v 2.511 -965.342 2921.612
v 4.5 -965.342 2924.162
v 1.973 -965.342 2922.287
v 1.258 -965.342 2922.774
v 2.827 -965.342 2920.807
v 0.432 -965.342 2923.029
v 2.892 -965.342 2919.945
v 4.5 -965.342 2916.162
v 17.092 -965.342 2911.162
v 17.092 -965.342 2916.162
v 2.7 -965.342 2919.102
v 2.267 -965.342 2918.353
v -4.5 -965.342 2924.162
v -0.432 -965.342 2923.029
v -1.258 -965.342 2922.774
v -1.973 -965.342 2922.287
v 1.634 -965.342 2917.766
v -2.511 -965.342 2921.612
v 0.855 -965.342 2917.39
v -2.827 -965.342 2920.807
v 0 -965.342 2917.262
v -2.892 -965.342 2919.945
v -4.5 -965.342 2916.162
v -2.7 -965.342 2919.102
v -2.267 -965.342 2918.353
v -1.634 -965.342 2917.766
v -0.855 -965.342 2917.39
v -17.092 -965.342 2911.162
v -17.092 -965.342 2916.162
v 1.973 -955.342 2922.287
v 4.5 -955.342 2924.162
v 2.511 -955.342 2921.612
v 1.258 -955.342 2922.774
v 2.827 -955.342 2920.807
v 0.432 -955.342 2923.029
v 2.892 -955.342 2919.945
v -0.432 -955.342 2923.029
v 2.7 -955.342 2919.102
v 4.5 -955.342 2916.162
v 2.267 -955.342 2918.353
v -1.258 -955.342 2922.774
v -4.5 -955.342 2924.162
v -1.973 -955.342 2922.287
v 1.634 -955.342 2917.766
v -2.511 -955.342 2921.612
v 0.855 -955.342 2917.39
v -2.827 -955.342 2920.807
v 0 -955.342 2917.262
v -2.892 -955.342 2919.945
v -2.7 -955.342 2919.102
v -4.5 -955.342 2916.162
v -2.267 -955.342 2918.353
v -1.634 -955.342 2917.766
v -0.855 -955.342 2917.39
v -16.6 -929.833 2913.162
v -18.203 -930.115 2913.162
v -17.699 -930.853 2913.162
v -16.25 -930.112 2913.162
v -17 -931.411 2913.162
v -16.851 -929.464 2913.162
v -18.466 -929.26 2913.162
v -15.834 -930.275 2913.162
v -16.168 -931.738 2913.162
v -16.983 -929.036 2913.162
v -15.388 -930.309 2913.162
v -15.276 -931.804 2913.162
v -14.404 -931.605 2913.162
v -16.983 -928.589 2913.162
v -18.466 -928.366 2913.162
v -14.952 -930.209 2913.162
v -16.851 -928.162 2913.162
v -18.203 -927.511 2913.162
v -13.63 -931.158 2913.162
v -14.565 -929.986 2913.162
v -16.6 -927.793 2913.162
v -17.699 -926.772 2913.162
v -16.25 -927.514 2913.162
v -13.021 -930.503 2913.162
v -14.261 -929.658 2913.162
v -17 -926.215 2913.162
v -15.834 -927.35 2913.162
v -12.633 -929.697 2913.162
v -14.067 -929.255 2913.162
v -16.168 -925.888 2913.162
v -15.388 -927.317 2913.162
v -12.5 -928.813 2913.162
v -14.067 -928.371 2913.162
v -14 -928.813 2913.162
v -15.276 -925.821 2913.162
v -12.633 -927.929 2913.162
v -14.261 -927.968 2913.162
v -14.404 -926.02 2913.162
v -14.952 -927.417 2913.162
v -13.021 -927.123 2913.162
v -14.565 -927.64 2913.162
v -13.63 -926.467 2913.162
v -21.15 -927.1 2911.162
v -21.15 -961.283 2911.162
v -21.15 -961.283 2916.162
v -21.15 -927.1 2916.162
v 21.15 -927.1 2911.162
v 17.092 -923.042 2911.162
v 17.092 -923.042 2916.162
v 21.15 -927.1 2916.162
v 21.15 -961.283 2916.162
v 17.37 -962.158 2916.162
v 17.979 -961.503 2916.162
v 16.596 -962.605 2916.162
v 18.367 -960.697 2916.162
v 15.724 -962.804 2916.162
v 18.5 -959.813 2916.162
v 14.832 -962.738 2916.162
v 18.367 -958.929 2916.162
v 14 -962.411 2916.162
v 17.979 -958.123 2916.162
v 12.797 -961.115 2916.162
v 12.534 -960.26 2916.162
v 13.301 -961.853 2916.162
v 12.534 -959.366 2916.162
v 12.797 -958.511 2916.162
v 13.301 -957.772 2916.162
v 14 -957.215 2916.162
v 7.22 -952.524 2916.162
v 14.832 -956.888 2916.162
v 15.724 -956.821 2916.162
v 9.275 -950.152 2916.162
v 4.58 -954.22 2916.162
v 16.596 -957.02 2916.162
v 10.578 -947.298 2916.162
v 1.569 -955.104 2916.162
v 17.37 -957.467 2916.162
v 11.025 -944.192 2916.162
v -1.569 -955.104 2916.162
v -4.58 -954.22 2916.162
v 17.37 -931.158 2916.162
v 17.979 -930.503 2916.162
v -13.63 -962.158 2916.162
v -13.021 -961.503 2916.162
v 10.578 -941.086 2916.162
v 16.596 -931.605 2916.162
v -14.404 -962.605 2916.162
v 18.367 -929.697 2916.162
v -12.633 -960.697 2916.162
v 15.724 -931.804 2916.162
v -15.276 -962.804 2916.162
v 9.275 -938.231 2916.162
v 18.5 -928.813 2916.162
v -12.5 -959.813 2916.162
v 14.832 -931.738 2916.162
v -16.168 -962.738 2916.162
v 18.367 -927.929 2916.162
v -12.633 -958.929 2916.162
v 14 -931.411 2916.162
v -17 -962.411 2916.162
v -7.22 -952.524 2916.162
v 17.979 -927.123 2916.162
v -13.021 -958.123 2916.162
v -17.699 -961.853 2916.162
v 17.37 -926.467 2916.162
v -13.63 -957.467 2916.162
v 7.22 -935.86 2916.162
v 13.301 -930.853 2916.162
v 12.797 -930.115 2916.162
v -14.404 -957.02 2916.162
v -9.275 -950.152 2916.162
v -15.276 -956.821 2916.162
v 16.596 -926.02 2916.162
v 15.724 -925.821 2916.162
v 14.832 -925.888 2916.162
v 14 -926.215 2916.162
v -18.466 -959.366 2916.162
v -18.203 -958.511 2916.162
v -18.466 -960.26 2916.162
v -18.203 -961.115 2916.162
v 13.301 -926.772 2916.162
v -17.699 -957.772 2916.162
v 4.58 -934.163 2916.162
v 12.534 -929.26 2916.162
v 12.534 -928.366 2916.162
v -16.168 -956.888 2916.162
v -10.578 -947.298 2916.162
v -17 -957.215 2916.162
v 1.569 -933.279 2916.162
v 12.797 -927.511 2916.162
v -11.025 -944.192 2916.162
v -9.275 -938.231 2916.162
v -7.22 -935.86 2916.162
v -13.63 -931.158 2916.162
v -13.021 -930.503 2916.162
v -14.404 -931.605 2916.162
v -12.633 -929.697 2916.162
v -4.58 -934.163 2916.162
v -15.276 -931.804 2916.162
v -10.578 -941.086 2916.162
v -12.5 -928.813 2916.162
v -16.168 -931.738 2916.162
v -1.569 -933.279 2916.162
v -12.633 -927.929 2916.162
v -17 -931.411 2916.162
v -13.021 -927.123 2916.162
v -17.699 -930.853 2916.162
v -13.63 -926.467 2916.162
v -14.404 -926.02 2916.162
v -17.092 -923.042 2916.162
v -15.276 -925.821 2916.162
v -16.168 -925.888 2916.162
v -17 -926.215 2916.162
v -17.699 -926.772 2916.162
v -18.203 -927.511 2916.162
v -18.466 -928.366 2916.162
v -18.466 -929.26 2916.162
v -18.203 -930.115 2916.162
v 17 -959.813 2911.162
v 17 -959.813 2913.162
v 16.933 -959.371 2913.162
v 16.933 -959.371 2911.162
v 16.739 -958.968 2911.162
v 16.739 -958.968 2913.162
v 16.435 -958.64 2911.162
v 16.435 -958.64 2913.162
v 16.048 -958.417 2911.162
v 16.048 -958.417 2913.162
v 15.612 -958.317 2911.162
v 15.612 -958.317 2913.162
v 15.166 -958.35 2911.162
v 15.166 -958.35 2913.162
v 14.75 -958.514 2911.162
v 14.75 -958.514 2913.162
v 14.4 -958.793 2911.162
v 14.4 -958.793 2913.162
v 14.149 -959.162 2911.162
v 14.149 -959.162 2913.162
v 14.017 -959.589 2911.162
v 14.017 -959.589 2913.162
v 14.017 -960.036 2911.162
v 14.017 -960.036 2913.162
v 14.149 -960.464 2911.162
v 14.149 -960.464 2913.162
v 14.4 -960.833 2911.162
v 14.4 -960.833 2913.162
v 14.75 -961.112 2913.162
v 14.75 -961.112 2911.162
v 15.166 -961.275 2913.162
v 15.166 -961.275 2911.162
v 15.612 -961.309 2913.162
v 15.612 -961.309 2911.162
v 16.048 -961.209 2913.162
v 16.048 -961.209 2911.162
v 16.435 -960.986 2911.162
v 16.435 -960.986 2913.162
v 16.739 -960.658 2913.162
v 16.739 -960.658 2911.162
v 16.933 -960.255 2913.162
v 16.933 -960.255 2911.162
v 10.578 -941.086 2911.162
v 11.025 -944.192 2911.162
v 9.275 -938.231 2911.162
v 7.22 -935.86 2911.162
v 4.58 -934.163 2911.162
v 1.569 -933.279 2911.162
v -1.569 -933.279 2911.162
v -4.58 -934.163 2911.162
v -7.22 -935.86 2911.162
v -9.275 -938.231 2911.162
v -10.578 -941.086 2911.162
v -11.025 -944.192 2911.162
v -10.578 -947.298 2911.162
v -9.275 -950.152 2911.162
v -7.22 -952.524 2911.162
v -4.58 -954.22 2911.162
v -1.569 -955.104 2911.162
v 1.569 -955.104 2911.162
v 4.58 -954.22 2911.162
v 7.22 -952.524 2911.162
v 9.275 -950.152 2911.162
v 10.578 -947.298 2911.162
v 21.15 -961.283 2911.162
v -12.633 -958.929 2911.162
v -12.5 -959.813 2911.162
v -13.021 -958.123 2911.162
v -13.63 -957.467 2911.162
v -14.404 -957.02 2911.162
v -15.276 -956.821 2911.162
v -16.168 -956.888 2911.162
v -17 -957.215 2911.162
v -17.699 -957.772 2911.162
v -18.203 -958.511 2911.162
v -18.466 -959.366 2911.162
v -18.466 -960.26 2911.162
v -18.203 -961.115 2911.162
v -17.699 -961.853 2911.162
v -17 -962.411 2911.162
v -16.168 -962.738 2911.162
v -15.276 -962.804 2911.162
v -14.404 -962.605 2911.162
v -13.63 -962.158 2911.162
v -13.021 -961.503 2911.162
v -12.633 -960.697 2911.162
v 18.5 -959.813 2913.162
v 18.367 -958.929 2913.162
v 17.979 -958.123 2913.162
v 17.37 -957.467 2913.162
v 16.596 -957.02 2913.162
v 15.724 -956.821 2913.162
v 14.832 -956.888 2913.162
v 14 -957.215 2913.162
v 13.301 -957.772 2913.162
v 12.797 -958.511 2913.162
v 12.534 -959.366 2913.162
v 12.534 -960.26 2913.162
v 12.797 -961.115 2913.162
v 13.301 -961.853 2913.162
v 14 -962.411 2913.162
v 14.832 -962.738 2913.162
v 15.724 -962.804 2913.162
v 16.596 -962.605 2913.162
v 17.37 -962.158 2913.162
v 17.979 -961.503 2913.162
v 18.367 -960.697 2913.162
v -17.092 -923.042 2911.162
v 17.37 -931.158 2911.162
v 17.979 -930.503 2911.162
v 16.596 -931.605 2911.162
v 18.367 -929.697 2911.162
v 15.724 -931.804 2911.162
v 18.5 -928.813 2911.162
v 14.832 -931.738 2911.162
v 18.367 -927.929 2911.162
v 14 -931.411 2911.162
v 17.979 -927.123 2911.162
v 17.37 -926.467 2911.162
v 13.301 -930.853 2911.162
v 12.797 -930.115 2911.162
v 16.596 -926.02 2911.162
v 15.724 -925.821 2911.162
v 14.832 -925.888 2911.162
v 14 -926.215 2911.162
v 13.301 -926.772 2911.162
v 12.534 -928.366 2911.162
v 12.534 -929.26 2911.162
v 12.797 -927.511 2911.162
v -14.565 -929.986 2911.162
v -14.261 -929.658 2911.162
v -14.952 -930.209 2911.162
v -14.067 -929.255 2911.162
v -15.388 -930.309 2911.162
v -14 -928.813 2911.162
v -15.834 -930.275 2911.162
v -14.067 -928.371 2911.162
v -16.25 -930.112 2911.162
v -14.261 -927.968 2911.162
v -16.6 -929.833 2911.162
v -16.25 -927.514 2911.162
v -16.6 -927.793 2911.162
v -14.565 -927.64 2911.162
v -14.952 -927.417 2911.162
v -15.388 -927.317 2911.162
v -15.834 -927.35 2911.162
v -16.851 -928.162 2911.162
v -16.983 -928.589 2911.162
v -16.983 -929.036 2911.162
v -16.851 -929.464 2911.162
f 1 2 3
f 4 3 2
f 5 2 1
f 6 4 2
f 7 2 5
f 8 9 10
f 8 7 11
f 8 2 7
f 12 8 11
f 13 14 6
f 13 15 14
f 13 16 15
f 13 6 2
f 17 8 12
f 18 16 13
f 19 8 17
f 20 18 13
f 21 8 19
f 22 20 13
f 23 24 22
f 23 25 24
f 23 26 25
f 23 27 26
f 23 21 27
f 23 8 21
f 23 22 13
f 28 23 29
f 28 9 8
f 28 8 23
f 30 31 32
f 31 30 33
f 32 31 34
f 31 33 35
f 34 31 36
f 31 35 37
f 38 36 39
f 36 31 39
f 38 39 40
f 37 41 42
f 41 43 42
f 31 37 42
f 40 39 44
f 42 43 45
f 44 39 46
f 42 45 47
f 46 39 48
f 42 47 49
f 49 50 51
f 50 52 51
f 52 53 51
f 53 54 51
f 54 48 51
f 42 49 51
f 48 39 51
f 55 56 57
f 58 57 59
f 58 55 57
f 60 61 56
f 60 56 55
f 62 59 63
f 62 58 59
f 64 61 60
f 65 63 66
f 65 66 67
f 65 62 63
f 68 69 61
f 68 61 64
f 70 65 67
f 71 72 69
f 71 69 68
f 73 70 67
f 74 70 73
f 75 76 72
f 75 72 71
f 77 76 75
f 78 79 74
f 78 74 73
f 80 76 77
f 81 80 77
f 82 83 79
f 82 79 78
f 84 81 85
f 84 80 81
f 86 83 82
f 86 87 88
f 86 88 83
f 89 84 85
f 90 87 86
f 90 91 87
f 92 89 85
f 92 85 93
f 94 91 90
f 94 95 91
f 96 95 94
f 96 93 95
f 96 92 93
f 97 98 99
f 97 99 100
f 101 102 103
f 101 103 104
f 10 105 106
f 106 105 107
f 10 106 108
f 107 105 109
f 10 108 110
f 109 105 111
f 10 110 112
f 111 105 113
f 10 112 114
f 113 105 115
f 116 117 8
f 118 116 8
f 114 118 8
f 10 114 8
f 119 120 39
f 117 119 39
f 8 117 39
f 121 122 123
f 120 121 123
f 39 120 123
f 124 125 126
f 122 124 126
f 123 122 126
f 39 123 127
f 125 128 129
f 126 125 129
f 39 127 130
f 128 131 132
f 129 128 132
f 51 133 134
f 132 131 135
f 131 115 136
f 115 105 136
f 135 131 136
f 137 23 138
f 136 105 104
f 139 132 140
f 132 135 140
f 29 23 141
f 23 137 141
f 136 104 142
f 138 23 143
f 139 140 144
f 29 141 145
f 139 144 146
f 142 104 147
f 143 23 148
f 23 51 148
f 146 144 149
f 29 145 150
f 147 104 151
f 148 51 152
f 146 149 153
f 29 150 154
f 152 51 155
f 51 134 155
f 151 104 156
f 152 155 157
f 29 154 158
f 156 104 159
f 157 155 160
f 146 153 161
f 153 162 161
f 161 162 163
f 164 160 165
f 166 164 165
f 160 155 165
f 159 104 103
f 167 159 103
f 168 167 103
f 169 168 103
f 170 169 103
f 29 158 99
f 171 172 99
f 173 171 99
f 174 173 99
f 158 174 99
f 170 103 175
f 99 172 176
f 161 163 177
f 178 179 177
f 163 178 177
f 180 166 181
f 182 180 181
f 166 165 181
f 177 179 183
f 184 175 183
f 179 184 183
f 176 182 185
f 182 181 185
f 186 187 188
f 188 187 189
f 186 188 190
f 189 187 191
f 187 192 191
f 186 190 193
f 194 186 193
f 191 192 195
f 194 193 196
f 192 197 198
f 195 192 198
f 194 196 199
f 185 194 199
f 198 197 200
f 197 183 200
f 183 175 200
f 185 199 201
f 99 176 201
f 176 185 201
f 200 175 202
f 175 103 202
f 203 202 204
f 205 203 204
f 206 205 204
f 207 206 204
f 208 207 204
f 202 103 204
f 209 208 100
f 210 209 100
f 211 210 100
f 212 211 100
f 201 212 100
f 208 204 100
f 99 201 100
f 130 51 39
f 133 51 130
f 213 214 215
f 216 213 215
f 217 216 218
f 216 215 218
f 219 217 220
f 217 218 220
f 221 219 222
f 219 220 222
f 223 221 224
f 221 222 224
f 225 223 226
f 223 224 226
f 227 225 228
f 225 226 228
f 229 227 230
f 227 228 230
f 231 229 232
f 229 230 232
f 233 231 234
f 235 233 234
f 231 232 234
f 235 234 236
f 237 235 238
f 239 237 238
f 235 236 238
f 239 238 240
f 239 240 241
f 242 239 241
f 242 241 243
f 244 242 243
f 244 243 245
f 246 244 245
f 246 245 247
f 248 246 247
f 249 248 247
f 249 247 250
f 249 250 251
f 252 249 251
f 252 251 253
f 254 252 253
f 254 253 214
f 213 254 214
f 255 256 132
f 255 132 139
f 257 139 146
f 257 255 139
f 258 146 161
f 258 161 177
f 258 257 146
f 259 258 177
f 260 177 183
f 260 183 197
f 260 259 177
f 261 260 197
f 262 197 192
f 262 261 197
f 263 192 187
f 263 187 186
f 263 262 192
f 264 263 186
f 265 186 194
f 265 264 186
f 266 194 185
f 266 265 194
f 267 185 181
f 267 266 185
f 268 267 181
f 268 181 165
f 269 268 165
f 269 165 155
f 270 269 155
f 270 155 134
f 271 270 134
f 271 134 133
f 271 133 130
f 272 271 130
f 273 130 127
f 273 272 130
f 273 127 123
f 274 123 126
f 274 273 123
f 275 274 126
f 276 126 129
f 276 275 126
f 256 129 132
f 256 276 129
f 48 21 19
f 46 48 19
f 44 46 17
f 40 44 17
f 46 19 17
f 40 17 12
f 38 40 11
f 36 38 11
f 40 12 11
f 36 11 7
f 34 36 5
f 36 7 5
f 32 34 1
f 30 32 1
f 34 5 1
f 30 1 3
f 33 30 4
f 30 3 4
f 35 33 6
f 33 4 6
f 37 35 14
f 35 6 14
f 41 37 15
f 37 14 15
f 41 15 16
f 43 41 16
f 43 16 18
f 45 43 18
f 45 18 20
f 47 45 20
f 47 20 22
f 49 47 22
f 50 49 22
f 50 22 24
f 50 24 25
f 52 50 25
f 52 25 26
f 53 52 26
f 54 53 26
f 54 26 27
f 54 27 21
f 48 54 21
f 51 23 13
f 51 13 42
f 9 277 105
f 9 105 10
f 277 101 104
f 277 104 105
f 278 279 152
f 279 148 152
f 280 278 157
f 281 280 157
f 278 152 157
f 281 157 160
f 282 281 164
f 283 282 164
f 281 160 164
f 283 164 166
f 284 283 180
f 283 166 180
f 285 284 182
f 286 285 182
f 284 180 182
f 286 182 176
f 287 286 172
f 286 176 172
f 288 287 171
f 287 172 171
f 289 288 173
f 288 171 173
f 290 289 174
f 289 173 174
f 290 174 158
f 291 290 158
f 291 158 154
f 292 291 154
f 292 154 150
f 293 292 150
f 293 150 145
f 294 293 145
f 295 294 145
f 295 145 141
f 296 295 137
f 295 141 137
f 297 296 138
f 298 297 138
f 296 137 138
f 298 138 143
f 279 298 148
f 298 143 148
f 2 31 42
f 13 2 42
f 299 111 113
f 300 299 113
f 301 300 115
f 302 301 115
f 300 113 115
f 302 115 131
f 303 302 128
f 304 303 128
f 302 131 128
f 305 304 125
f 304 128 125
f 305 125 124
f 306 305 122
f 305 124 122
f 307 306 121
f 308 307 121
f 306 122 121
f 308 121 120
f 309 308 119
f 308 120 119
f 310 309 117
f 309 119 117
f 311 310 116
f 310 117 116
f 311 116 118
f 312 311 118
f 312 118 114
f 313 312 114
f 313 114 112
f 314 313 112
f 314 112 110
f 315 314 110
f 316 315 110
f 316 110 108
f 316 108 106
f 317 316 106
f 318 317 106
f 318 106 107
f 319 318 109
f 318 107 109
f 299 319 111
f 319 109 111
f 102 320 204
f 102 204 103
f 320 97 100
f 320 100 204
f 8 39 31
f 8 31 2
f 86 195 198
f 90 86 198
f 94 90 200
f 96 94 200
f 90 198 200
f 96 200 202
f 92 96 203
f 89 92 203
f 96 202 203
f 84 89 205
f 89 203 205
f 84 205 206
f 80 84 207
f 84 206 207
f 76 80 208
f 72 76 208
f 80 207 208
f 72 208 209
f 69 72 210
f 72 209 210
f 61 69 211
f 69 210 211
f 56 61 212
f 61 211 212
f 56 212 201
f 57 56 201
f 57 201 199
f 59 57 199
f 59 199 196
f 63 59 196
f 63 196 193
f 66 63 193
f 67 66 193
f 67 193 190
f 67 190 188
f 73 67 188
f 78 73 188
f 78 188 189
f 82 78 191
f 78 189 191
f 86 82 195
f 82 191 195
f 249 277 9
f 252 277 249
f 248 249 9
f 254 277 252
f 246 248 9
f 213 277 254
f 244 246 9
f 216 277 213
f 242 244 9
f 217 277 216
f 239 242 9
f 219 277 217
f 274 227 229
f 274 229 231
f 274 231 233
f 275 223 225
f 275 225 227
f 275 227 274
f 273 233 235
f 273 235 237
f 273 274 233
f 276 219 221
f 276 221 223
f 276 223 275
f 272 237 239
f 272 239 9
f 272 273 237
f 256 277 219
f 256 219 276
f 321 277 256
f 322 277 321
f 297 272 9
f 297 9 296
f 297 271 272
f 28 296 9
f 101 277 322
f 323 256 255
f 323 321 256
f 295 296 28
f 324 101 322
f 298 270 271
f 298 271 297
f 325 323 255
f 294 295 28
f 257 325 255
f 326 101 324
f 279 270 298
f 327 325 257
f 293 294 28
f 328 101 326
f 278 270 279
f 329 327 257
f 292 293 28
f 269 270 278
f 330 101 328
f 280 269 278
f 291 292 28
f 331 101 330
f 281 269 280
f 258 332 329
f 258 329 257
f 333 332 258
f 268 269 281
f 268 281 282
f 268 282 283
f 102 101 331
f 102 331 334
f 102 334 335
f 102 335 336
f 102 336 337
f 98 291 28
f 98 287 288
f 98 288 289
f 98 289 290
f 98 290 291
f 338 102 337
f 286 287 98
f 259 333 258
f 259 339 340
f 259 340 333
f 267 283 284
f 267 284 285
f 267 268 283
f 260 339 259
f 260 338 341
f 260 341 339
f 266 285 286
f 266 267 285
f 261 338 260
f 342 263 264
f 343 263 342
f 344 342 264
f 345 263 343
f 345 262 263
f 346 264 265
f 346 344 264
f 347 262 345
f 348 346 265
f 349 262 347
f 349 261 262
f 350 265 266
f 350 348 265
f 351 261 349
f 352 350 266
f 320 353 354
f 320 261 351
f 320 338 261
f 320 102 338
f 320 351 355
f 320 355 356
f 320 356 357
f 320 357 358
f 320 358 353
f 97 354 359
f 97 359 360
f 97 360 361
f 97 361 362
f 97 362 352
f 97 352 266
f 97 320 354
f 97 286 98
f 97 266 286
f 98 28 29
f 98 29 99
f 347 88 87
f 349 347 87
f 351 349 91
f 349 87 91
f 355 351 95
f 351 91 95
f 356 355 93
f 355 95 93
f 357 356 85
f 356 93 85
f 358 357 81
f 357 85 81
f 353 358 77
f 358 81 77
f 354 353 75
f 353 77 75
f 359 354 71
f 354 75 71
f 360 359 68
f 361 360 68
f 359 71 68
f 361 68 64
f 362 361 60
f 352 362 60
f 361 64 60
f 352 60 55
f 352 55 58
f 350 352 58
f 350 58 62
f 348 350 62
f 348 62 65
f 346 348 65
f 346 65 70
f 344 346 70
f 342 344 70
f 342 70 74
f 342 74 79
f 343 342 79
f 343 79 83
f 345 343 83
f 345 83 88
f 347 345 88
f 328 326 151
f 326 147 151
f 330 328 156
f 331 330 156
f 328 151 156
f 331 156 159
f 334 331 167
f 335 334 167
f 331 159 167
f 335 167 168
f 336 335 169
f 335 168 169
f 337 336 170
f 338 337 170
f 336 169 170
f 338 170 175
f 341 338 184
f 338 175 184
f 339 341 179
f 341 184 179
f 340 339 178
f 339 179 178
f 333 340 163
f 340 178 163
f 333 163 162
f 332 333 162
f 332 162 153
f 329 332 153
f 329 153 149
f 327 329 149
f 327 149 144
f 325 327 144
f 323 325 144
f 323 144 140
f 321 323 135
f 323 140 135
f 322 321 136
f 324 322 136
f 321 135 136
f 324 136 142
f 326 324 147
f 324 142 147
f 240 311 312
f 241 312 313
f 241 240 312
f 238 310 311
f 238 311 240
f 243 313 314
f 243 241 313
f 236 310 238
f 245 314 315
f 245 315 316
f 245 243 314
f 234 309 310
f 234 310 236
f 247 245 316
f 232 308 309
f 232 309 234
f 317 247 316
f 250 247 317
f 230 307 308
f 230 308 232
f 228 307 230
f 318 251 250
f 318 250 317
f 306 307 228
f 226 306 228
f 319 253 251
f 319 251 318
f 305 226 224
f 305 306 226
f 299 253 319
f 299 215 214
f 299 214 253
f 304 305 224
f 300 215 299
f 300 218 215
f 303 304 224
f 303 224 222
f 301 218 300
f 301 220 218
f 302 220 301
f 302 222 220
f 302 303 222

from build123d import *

# Parameters (mm, degrees)
SKETCH1_R           = 11025
BOSS_EXTRUDE1_DEPTH = 5000
BOSS_EXTRUDE2_DEPTH = 8000
SKETCH4_R           = 3000
CUT_EXTRUDE2_DEPTH  = 3000
SKETCH5_R           = 1500
CUT_EXTRUDE3_DEPTH  = 3000
SKETCH6_R           = 3000
CUT_EXTRUDE4_DEPTH  = 3000
SKETCH3_R           = 2900
CUT_EXTRUDE1_DEPTH  = 12018
SCALE6_SCALE        = 0.001


with BuildPart() as part:
    # Sketch1 → Boss-Extrude1 (new body)
    with BuildSketch(Plane.XY):
        Polygon((-21150, 17212.99935917), (-17091.781053823, 21271.218305346), (17091.781053823, 21271.218305346), (21150, 17212.99935917), (21150, -16970.562748477), (17091.781053823, -21028.781694654), (-17091.781053823, -21028.781694654), (-21150, -16970.562748477), align=None)
        with Locations((0, 121.218305346)):
            Circle(SKETCH1_R, mode=Mode.SUBTRACT)
    extrude(amount=BOSS_EXTRUDE1_DEPTH)

    # Sketch2 → Boss-Extrude2 (add)
    with BuildSketch(Plane.XY.offset(5000)):
        Polygon((0, -11028.781694654), (4500, -11028.781694654), (4500, -21028.781694654), (-4500, -21028.781694654), (-4500, -11028.781694654), align=None)
    extrude(amount=BOSS_EXTRUDE2_DEPTH)

    # Sketch4 → Cut-Extrude2 (cut)
    with BuildSketch(Plane.XY.offset(5000)):
        with Locations((-15500, 15500)):
            Circle(SKETCH4_R)
        with Locations((15500, 15500)):
            Circle(SKETCH4_R)
        with Locations((15500, -15500)):
            Circle(SKETCH4_R)
        with Locations((-15500, -15500)):
            Circle(SKETCH4_R)
    extrude(amount=-CUT_EXTRUDE2_DEPTH, mode=Mode.SUBTRACT)

    # Sketch5 → Cut-Extrude3 (cut)
    with BuildSketch(Plane.XY.offset(2000)):
        with Locations((-15500, 15500)):
            Circle(SKETCH5_R)
        with Locations((15500, -15500)):
            Circle(SKETCH5_R)
    extrude(amount=-CUT_EXTRUDE3_DEPTH, mode=Mode.SUBTRACT)

    # Sketch6 → Cut-Extrude4 (cut)
    with BuildSketch(Plane.XY.offset(2000)):
        with Locations((15500, 15500)):
            Circle(SKETCH6_R)
        with Locations((-15500, -15500)):
            Circle(SKETCH6_R)
    extrude(amount=-CUT_EXTRUDE4_DEPTH, mode=Mode.SUBTRACT)

    # Sketch3 → Cut-Extrude1 (cut)
    with BuildSketch(Plane.XZ.offset(21028.781694654)):
        with Locations(Location((0, 9000, 0), (0, 0, 270))):
            Circle(SKETCH3_R)
    extrude(amount=-CUT_EXTRUDE1_DEPTH, mode=Mode.SUBTRACT)


with BuildPart() as part_1:
    # Scale6: scaled about (0, -945.258123271, 2914.075668663)
    add(part.part.scale(SCALE6_SCALE).moved(Location((0, -944.312865148, 2911.161592994))))


solid = part_1.part
